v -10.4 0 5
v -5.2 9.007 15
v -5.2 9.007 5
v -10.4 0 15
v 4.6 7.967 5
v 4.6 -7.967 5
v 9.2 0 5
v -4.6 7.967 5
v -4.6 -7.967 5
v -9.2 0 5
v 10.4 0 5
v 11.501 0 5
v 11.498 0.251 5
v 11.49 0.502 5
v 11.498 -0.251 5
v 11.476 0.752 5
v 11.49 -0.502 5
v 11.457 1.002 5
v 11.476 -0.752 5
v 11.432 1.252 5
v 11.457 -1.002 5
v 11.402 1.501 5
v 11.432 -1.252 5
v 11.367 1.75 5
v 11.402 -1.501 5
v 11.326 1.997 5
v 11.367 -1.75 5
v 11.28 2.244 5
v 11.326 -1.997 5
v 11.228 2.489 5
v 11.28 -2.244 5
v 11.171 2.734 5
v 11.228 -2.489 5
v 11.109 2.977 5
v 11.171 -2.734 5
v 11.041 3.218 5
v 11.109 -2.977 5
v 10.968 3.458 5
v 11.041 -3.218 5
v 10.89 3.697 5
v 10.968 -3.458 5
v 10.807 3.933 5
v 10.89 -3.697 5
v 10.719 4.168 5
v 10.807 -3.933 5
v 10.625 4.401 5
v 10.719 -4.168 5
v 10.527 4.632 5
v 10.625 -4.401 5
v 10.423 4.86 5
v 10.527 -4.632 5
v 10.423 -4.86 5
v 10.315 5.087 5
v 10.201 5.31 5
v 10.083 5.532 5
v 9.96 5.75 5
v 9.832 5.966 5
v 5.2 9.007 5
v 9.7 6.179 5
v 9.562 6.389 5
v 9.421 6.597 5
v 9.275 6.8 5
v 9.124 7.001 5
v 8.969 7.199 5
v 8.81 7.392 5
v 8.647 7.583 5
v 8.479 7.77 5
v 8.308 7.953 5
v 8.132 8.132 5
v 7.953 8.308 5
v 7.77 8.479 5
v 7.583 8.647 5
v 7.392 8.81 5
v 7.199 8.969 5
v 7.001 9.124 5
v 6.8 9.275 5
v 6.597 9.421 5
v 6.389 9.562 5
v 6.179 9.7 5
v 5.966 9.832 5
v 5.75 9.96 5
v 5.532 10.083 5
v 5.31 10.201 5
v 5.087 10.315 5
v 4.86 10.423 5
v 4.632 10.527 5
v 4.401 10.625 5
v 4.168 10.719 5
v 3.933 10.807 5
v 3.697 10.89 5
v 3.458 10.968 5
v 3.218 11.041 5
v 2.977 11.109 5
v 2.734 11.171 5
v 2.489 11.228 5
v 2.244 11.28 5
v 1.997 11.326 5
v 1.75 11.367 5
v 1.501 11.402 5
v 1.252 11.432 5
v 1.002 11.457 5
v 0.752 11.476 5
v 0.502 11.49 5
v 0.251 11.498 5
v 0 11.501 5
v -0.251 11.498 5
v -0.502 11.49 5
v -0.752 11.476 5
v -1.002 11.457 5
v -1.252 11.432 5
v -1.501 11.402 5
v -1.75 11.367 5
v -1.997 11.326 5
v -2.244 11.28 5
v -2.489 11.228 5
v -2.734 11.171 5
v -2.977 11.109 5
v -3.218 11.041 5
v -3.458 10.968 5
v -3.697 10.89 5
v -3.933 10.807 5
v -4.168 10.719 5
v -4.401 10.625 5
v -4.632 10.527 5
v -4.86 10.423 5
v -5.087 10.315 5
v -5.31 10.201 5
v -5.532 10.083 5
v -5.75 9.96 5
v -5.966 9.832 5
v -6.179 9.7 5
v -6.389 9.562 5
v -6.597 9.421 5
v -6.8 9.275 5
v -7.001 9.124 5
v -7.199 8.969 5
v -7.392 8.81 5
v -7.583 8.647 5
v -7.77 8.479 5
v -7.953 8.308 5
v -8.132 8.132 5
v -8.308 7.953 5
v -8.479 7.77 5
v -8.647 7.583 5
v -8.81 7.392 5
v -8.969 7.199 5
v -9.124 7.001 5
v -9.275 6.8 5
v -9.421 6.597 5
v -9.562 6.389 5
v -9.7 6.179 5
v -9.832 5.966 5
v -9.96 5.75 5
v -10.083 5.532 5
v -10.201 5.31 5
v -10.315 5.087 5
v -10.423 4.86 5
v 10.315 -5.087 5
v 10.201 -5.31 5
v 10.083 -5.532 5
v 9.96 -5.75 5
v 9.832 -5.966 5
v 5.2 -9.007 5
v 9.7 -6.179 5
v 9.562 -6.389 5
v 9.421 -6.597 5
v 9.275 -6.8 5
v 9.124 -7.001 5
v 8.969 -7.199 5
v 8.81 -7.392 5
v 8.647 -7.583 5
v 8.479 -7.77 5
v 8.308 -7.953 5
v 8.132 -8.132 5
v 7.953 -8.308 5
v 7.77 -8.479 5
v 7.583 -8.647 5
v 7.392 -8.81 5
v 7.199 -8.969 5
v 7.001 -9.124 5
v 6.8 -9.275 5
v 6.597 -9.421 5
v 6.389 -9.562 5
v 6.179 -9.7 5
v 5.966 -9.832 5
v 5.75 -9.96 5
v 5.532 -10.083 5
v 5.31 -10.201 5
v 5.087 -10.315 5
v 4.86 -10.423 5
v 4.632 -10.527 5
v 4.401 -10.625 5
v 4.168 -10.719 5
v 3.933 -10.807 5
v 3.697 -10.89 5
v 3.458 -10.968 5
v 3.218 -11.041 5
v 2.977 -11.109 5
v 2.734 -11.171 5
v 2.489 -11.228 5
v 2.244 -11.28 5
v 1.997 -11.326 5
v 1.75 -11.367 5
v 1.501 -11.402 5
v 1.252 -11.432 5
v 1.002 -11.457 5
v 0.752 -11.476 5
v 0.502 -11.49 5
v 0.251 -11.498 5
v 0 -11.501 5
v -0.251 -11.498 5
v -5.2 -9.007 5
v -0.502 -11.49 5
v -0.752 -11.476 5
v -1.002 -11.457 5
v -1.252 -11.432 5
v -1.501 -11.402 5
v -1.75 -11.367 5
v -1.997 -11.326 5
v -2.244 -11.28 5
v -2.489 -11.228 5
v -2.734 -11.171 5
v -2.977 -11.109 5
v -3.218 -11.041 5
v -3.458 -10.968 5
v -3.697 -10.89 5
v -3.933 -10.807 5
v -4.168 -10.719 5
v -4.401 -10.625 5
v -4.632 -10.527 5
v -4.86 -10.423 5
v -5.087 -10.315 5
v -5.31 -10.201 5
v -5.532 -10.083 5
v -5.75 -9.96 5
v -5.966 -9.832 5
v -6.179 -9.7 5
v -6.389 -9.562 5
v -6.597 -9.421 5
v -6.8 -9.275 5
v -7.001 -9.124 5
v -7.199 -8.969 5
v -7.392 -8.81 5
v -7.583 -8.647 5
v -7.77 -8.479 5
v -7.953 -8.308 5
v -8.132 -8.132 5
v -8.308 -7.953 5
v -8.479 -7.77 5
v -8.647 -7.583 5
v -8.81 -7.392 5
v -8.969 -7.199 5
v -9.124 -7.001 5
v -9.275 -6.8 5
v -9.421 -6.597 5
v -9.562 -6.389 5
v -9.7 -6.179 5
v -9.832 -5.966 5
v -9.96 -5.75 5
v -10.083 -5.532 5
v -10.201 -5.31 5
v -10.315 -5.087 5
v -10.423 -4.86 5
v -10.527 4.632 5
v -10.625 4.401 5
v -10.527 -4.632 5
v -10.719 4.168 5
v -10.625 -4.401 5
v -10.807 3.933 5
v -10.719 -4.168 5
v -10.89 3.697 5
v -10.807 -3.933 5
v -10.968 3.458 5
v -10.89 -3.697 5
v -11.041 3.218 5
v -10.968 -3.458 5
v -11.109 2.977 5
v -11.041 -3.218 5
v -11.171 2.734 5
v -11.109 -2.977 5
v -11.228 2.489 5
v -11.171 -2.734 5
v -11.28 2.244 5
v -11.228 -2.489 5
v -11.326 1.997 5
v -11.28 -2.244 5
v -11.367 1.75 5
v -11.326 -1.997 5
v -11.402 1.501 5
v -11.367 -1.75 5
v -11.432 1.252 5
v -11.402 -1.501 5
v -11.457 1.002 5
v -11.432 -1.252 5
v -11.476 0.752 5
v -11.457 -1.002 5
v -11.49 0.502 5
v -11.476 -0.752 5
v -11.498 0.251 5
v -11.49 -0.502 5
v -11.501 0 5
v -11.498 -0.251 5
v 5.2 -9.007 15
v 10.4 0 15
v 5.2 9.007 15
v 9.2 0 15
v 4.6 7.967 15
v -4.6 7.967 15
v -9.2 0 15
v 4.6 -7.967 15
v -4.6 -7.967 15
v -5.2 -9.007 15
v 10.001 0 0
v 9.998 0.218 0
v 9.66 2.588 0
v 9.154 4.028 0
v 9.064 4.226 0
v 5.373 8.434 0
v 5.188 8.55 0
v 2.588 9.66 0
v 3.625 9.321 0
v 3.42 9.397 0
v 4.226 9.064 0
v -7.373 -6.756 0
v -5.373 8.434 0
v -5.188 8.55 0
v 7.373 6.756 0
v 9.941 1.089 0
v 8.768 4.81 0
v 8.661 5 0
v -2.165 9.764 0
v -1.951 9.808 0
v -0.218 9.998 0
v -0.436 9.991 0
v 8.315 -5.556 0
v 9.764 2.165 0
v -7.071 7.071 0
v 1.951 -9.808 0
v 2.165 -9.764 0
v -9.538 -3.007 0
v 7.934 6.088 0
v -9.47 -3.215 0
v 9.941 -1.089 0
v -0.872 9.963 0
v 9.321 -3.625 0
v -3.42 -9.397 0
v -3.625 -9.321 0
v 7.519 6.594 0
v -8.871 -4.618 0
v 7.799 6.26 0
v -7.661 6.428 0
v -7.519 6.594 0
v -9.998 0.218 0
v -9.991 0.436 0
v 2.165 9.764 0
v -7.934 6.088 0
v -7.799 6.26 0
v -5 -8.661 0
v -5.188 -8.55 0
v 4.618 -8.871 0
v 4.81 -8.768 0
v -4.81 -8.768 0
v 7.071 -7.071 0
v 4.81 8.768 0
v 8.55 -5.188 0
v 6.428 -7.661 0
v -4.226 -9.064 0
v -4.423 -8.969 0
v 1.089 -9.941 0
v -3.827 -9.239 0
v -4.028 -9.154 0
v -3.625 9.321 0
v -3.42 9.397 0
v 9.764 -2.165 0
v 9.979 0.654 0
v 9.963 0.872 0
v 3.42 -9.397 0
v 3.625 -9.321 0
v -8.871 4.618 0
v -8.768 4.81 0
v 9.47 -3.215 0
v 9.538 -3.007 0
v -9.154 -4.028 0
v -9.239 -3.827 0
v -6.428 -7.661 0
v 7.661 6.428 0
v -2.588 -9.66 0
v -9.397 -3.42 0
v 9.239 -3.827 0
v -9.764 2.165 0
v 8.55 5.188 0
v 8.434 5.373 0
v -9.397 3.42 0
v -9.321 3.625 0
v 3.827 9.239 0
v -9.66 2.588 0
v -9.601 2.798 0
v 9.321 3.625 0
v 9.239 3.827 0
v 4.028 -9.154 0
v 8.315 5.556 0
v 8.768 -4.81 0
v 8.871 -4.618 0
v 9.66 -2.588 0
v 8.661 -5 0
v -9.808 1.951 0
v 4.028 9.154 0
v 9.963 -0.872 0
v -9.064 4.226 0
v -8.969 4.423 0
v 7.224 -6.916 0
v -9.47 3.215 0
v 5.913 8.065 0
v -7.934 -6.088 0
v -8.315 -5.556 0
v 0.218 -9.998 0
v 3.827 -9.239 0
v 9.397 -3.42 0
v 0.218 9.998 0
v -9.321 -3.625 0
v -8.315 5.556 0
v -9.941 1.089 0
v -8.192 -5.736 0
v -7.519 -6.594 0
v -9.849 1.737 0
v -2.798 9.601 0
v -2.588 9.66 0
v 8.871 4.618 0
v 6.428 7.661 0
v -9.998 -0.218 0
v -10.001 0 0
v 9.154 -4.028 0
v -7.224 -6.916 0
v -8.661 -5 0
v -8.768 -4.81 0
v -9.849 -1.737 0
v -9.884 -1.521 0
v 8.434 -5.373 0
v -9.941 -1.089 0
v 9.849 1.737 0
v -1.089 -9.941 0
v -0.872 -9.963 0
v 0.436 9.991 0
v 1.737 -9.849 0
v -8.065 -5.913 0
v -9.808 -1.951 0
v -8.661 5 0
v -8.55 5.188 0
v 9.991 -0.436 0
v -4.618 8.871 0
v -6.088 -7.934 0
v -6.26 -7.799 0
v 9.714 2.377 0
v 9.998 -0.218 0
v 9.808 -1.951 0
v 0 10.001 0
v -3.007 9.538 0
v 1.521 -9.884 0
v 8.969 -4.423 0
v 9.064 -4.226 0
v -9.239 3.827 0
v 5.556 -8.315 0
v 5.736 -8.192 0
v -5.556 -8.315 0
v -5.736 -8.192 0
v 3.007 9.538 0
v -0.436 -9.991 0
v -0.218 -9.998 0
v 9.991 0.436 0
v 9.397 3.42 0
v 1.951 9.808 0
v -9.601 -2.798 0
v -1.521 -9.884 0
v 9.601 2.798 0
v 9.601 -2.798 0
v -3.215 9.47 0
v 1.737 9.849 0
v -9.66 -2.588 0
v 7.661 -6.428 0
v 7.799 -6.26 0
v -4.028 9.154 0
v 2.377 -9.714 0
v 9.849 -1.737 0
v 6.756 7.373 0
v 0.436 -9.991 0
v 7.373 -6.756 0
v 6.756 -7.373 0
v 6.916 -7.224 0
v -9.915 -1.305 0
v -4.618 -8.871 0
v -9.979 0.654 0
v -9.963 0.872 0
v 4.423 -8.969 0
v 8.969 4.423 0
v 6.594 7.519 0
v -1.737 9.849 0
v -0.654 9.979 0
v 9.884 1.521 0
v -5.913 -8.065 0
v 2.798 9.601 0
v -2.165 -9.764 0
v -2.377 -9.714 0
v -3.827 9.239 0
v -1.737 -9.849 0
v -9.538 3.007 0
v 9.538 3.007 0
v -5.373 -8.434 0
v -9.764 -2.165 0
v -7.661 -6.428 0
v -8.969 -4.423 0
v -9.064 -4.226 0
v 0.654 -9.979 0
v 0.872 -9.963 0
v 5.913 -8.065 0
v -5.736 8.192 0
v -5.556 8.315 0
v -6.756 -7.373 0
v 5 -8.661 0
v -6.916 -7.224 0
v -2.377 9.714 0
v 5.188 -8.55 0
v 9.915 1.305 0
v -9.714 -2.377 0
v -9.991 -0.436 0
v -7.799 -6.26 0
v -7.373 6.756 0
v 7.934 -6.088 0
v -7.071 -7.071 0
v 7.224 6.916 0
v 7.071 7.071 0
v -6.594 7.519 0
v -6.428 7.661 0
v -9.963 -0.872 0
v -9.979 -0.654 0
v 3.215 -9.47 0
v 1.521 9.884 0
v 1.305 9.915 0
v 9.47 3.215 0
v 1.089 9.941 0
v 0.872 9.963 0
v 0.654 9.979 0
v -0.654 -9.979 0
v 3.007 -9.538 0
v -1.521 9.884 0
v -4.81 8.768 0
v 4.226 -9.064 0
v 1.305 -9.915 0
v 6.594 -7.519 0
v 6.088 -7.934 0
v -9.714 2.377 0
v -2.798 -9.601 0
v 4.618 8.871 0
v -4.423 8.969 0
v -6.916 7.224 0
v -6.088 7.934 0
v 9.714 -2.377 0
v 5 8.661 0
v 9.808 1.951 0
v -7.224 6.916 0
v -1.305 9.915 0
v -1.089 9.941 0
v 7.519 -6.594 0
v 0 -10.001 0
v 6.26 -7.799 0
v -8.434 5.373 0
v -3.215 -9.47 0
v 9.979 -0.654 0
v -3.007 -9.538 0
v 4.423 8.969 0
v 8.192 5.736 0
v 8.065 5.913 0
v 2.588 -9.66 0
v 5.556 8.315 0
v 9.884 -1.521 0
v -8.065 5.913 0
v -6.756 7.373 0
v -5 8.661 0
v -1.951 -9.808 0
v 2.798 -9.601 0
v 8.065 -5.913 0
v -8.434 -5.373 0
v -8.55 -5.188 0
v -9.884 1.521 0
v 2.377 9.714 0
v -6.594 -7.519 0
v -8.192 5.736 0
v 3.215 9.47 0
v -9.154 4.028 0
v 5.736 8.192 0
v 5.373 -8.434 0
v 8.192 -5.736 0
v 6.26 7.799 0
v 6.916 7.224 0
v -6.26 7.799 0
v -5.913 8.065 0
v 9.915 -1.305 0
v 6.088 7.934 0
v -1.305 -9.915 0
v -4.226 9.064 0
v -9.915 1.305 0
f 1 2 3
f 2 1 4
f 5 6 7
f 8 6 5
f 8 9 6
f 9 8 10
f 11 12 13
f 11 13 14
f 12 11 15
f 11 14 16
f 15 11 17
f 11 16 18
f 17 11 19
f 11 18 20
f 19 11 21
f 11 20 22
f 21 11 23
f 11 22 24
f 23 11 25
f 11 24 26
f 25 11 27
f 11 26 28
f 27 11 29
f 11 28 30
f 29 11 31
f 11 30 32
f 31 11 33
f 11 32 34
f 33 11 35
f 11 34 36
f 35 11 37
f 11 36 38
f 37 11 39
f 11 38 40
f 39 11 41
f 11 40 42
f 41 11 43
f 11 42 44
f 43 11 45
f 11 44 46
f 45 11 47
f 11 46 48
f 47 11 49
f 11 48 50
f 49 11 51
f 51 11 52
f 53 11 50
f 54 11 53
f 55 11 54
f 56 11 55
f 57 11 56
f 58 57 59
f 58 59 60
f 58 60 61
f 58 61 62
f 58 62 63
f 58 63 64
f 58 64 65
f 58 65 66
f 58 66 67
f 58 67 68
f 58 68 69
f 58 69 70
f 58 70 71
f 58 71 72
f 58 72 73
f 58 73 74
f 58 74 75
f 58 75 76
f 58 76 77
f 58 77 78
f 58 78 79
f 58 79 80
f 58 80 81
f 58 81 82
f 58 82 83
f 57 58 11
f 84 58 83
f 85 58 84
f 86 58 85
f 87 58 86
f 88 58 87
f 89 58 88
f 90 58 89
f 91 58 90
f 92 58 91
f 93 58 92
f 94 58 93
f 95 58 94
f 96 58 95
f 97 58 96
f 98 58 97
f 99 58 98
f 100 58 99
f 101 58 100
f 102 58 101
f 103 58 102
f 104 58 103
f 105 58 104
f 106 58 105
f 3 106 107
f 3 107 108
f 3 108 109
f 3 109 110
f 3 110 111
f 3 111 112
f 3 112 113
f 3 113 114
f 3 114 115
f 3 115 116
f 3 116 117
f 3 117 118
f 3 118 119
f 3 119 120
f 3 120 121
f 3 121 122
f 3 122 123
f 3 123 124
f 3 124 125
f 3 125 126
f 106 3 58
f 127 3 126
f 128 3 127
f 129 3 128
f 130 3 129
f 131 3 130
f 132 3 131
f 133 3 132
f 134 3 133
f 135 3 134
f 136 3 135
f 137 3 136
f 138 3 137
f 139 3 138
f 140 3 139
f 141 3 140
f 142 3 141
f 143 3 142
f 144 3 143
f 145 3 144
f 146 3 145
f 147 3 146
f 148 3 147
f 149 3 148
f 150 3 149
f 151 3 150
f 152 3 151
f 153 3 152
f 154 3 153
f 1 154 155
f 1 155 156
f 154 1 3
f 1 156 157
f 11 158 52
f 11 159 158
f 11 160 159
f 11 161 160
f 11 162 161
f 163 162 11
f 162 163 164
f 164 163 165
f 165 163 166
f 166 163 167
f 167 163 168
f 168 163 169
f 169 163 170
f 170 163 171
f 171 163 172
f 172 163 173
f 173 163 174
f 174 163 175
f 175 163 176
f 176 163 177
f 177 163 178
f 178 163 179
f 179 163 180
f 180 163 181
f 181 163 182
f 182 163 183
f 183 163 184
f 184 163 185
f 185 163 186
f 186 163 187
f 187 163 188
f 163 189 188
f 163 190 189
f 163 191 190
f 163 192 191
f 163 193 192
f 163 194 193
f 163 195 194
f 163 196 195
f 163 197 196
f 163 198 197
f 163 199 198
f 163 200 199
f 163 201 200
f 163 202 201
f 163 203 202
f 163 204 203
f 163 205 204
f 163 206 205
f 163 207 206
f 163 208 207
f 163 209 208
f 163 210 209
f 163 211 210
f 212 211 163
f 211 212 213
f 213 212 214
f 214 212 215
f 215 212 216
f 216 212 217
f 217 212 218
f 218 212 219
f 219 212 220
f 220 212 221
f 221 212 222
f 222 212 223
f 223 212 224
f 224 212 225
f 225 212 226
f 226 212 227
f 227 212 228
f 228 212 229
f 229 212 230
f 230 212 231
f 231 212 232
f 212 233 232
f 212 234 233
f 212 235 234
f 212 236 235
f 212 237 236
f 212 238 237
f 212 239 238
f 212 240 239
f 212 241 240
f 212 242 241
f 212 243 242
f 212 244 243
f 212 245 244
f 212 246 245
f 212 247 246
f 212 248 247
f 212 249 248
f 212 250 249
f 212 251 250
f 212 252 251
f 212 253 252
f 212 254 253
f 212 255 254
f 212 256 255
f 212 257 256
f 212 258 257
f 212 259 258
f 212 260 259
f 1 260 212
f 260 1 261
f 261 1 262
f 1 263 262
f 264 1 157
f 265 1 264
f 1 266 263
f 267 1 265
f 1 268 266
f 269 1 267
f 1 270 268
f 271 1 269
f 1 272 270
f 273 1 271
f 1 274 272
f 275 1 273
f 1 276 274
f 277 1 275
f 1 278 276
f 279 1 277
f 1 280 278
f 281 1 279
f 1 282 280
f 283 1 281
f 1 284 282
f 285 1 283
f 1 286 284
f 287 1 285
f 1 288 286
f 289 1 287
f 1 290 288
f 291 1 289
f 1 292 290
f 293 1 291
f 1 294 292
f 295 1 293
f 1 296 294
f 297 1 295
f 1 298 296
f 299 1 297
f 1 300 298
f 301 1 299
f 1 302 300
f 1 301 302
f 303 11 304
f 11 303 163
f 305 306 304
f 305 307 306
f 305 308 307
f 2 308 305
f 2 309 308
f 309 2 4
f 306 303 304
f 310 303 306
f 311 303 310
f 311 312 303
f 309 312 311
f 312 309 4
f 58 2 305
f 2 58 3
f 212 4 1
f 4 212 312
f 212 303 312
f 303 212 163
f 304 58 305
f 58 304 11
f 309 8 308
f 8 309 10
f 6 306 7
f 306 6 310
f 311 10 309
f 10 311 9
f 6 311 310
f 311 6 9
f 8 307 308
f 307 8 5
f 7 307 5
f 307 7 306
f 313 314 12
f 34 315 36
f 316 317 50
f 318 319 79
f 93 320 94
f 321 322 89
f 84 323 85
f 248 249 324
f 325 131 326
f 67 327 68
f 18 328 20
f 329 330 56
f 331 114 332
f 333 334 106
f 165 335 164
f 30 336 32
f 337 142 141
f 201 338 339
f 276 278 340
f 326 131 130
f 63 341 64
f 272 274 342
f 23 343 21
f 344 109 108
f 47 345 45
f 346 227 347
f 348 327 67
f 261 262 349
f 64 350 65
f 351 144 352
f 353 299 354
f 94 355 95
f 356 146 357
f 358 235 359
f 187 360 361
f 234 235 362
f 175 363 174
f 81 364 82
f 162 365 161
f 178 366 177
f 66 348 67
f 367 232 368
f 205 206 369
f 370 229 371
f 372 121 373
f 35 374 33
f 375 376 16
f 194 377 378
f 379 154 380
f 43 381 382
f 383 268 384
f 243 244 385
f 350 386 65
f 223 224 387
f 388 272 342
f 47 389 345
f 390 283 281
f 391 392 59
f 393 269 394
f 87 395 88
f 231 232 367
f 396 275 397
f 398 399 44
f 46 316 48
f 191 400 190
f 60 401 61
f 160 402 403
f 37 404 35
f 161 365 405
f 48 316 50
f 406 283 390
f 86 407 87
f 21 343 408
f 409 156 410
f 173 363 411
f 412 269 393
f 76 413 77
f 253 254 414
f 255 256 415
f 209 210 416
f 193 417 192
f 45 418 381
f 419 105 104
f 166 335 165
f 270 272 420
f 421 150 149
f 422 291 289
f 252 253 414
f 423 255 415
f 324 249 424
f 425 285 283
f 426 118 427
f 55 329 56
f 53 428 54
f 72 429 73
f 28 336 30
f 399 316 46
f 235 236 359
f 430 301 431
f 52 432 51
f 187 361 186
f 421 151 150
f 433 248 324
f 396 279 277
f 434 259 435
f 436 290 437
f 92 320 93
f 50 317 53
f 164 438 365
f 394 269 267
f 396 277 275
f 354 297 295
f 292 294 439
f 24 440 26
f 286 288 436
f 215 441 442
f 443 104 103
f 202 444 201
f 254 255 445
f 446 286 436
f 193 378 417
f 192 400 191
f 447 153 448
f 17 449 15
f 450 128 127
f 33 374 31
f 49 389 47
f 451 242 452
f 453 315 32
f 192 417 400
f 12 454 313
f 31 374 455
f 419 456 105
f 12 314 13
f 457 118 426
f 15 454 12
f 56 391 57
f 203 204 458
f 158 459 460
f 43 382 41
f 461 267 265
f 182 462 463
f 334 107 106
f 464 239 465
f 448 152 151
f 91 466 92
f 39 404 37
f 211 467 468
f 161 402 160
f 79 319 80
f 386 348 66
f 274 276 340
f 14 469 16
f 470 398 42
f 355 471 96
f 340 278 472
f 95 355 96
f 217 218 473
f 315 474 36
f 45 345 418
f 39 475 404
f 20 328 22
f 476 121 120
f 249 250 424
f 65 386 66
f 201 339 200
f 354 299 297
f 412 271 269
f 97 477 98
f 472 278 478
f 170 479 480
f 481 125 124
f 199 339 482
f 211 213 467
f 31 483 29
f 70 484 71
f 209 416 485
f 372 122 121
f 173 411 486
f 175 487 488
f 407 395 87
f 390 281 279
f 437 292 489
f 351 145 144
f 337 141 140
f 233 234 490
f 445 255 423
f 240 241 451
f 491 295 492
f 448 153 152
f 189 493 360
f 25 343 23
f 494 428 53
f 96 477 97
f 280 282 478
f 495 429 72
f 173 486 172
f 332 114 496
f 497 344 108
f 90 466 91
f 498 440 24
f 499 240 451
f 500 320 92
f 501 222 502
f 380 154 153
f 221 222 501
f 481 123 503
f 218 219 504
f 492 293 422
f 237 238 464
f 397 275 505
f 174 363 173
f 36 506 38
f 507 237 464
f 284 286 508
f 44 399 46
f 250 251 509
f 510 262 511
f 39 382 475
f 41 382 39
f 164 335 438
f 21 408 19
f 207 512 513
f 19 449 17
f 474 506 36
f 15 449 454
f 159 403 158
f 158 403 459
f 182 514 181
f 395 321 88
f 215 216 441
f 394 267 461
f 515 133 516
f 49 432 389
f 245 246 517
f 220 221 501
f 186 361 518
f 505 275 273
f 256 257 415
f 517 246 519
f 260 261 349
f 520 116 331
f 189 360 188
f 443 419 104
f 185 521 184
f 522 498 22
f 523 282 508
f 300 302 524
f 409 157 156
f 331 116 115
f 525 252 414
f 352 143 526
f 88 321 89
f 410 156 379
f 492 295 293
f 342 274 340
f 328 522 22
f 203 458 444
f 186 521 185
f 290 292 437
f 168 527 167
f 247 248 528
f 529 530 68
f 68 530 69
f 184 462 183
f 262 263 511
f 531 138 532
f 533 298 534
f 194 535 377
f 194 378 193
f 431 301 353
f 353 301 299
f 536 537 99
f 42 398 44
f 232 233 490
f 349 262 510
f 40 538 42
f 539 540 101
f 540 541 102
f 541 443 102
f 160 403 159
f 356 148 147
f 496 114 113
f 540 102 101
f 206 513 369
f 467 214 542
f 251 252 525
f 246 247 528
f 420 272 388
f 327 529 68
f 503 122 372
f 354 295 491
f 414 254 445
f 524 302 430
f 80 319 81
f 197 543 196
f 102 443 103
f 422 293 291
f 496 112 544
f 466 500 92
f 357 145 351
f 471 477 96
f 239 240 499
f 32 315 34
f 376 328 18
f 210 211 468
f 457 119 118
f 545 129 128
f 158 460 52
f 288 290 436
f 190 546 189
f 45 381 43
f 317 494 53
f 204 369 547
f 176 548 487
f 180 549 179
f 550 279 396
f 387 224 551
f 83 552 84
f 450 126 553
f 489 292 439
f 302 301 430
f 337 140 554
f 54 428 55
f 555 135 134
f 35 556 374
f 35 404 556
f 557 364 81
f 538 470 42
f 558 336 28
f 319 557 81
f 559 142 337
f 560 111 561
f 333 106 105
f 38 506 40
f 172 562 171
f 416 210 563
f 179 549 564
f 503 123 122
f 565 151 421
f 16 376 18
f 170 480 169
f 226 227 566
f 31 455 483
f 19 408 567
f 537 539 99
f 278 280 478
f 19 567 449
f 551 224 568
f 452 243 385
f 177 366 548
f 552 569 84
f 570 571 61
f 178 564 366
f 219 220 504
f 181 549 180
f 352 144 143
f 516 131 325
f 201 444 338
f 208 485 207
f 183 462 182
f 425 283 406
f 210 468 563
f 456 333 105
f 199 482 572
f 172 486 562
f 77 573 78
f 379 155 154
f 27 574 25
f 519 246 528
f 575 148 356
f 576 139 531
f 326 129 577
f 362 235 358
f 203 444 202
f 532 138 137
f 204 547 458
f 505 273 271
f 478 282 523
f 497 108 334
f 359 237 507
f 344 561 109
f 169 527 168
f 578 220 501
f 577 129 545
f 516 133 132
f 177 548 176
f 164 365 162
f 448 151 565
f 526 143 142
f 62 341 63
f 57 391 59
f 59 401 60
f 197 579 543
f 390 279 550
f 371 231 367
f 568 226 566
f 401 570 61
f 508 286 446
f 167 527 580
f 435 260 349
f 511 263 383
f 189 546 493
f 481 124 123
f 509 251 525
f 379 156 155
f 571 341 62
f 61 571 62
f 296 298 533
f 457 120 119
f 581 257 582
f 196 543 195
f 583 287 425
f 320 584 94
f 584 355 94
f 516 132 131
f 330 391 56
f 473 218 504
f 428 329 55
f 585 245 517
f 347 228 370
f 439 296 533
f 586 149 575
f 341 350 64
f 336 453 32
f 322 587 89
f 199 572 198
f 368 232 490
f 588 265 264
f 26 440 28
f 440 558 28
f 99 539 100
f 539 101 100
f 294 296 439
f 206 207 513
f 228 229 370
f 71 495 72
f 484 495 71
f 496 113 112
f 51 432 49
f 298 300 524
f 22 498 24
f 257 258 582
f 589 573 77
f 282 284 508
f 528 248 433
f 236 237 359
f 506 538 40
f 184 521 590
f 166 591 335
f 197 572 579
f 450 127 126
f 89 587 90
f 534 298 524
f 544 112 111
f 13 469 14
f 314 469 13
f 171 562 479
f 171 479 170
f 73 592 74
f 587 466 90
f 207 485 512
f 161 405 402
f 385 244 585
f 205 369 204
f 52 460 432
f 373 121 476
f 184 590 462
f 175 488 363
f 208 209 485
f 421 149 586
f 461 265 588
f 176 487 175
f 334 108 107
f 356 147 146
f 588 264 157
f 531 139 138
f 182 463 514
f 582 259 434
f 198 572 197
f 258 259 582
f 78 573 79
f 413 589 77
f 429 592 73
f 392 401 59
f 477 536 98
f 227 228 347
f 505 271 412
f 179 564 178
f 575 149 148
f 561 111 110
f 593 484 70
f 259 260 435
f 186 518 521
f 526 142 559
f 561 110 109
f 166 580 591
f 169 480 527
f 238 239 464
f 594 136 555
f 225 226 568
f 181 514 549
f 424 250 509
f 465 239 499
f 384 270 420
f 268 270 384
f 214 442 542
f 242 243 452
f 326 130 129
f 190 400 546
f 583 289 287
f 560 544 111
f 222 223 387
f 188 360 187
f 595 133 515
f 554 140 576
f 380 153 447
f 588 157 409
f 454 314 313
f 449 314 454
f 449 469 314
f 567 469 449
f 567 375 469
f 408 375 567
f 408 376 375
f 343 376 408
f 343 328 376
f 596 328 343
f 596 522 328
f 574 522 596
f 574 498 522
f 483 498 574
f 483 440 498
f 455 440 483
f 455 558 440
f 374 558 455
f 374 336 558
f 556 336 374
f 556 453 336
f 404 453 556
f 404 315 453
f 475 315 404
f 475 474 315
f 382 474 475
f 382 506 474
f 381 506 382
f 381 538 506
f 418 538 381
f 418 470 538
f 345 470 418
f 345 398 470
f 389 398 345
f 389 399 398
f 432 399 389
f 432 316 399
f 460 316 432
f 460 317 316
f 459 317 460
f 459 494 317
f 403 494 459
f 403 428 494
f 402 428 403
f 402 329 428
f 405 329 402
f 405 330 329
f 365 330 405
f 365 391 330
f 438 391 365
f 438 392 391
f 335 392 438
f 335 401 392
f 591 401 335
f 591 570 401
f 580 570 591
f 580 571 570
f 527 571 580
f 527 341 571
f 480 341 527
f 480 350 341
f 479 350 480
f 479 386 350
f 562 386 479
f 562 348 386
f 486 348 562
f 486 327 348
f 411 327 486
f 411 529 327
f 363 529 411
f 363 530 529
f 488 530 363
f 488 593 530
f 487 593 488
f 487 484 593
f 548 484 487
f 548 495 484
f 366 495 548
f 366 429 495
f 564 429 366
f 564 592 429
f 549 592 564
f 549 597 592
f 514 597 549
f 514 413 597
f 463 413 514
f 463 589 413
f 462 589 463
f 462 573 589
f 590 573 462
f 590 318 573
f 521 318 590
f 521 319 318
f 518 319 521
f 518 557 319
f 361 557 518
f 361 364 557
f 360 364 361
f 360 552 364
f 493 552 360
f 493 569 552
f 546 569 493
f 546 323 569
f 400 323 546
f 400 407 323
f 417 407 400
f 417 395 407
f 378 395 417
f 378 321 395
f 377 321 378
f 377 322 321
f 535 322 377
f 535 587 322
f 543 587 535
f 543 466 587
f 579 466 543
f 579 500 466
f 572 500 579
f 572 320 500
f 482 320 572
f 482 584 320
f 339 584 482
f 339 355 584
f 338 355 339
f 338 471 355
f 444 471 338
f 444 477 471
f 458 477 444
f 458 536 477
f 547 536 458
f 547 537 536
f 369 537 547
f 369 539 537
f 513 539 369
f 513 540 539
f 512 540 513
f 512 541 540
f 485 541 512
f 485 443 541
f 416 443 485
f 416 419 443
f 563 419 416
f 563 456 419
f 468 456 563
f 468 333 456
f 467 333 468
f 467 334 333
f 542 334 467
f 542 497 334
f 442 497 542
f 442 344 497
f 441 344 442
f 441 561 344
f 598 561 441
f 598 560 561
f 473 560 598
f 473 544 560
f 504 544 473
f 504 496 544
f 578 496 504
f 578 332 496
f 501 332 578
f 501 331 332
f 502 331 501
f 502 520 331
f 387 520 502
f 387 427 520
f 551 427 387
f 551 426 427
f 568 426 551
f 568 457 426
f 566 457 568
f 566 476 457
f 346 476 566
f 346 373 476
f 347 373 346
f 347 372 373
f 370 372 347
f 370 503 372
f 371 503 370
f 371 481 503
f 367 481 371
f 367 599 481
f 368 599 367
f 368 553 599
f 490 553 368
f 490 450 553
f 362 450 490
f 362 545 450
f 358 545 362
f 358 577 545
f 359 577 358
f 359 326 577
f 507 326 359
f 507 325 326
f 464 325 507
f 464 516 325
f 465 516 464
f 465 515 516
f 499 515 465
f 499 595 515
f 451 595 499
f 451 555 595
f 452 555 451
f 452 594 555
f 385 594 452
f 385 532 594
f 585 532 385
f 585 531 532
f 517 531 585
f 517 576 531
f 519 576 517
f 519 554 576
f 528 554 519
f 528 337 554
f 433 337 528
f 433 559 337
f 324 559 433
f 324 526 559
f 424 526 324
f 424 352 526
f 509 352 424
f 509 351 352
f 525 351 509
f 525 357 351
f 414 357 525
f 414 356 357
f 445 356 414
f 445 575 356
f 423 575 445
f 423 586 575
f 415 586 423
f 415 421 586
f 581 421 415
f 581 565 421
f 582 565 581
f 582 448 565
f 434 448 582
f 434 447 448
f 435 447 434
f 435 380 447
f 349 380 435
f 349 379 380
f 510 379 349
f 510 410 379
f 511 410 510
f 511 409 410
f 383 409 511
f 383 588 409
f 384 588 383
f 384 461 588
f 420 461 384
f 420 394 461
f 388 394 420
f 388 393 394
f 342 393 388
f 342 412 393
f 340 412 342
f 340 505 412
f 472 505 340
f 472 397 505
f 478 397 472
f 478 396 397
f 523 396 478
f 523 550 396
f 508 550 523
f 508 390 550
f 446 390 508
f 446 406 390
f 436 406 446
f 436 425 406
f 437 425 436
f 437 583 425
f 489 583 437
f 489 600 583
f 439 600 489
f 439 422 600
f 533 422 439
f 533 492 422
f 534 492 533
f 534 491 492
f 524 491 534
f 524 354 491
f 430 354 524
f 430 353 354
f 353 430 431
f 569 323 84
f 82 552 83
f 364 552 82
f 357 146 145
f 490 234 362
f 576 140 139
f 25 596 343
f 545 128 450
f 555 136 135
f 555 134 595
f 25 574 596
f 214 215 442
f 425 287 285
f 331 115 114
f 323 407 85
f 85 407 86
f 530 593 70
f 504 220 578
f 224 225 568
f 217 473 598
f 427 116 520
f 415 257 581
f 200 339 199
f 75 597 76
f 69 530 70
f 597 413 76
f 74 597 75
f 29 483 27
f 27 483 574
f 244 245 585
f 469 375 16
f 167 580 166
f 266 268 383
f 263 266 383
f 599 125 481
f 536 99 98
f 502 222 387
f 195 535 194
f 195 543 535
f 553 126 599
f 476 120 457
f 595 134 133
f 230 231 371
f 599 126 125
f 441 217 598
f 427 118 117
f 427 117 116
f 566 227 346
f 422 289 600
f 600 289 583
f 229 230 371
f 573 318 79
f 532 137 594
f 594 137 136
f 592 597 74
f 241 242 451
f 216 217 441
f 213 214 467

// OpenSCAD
use <MCAD/regular_shapes.scad>

min_od=20;
max_od=23;
hat_height=5;
inner_height=10;
min_thickness=2.4;
fn=4 * 72;
$fn=fn;

module cone_outer(height,radius1,radius2,fn=fn){
   fudge = 1/cos(180/fn);
   cylinder(h=height,r1=radius1*fudge,r2=radius2*fudge,$fn=fn);
}

module hexagon(diameter)
{
    // too many warnings using the MCAD hexagon, issues with naming/not naming parameters
    // and it using a deprecated reg_polygon method
    r = diameter/2;
    regular_polygon(6,r);
}

module PoolFencePlug(id) {
    min_or=min_od  / 2;
    max_or=max_od / 2;
    cone_outer(hat_height, min_or, max_or);
    ir = id / 2;
    translate([0, 0, hat_height]) difference() {
        linear_extrude(inner_height) hexagon(id);
        linear_extrude(inner_height) hexagon(id - min_thickness);
    }
}

PoolFencePlug(20.8);
